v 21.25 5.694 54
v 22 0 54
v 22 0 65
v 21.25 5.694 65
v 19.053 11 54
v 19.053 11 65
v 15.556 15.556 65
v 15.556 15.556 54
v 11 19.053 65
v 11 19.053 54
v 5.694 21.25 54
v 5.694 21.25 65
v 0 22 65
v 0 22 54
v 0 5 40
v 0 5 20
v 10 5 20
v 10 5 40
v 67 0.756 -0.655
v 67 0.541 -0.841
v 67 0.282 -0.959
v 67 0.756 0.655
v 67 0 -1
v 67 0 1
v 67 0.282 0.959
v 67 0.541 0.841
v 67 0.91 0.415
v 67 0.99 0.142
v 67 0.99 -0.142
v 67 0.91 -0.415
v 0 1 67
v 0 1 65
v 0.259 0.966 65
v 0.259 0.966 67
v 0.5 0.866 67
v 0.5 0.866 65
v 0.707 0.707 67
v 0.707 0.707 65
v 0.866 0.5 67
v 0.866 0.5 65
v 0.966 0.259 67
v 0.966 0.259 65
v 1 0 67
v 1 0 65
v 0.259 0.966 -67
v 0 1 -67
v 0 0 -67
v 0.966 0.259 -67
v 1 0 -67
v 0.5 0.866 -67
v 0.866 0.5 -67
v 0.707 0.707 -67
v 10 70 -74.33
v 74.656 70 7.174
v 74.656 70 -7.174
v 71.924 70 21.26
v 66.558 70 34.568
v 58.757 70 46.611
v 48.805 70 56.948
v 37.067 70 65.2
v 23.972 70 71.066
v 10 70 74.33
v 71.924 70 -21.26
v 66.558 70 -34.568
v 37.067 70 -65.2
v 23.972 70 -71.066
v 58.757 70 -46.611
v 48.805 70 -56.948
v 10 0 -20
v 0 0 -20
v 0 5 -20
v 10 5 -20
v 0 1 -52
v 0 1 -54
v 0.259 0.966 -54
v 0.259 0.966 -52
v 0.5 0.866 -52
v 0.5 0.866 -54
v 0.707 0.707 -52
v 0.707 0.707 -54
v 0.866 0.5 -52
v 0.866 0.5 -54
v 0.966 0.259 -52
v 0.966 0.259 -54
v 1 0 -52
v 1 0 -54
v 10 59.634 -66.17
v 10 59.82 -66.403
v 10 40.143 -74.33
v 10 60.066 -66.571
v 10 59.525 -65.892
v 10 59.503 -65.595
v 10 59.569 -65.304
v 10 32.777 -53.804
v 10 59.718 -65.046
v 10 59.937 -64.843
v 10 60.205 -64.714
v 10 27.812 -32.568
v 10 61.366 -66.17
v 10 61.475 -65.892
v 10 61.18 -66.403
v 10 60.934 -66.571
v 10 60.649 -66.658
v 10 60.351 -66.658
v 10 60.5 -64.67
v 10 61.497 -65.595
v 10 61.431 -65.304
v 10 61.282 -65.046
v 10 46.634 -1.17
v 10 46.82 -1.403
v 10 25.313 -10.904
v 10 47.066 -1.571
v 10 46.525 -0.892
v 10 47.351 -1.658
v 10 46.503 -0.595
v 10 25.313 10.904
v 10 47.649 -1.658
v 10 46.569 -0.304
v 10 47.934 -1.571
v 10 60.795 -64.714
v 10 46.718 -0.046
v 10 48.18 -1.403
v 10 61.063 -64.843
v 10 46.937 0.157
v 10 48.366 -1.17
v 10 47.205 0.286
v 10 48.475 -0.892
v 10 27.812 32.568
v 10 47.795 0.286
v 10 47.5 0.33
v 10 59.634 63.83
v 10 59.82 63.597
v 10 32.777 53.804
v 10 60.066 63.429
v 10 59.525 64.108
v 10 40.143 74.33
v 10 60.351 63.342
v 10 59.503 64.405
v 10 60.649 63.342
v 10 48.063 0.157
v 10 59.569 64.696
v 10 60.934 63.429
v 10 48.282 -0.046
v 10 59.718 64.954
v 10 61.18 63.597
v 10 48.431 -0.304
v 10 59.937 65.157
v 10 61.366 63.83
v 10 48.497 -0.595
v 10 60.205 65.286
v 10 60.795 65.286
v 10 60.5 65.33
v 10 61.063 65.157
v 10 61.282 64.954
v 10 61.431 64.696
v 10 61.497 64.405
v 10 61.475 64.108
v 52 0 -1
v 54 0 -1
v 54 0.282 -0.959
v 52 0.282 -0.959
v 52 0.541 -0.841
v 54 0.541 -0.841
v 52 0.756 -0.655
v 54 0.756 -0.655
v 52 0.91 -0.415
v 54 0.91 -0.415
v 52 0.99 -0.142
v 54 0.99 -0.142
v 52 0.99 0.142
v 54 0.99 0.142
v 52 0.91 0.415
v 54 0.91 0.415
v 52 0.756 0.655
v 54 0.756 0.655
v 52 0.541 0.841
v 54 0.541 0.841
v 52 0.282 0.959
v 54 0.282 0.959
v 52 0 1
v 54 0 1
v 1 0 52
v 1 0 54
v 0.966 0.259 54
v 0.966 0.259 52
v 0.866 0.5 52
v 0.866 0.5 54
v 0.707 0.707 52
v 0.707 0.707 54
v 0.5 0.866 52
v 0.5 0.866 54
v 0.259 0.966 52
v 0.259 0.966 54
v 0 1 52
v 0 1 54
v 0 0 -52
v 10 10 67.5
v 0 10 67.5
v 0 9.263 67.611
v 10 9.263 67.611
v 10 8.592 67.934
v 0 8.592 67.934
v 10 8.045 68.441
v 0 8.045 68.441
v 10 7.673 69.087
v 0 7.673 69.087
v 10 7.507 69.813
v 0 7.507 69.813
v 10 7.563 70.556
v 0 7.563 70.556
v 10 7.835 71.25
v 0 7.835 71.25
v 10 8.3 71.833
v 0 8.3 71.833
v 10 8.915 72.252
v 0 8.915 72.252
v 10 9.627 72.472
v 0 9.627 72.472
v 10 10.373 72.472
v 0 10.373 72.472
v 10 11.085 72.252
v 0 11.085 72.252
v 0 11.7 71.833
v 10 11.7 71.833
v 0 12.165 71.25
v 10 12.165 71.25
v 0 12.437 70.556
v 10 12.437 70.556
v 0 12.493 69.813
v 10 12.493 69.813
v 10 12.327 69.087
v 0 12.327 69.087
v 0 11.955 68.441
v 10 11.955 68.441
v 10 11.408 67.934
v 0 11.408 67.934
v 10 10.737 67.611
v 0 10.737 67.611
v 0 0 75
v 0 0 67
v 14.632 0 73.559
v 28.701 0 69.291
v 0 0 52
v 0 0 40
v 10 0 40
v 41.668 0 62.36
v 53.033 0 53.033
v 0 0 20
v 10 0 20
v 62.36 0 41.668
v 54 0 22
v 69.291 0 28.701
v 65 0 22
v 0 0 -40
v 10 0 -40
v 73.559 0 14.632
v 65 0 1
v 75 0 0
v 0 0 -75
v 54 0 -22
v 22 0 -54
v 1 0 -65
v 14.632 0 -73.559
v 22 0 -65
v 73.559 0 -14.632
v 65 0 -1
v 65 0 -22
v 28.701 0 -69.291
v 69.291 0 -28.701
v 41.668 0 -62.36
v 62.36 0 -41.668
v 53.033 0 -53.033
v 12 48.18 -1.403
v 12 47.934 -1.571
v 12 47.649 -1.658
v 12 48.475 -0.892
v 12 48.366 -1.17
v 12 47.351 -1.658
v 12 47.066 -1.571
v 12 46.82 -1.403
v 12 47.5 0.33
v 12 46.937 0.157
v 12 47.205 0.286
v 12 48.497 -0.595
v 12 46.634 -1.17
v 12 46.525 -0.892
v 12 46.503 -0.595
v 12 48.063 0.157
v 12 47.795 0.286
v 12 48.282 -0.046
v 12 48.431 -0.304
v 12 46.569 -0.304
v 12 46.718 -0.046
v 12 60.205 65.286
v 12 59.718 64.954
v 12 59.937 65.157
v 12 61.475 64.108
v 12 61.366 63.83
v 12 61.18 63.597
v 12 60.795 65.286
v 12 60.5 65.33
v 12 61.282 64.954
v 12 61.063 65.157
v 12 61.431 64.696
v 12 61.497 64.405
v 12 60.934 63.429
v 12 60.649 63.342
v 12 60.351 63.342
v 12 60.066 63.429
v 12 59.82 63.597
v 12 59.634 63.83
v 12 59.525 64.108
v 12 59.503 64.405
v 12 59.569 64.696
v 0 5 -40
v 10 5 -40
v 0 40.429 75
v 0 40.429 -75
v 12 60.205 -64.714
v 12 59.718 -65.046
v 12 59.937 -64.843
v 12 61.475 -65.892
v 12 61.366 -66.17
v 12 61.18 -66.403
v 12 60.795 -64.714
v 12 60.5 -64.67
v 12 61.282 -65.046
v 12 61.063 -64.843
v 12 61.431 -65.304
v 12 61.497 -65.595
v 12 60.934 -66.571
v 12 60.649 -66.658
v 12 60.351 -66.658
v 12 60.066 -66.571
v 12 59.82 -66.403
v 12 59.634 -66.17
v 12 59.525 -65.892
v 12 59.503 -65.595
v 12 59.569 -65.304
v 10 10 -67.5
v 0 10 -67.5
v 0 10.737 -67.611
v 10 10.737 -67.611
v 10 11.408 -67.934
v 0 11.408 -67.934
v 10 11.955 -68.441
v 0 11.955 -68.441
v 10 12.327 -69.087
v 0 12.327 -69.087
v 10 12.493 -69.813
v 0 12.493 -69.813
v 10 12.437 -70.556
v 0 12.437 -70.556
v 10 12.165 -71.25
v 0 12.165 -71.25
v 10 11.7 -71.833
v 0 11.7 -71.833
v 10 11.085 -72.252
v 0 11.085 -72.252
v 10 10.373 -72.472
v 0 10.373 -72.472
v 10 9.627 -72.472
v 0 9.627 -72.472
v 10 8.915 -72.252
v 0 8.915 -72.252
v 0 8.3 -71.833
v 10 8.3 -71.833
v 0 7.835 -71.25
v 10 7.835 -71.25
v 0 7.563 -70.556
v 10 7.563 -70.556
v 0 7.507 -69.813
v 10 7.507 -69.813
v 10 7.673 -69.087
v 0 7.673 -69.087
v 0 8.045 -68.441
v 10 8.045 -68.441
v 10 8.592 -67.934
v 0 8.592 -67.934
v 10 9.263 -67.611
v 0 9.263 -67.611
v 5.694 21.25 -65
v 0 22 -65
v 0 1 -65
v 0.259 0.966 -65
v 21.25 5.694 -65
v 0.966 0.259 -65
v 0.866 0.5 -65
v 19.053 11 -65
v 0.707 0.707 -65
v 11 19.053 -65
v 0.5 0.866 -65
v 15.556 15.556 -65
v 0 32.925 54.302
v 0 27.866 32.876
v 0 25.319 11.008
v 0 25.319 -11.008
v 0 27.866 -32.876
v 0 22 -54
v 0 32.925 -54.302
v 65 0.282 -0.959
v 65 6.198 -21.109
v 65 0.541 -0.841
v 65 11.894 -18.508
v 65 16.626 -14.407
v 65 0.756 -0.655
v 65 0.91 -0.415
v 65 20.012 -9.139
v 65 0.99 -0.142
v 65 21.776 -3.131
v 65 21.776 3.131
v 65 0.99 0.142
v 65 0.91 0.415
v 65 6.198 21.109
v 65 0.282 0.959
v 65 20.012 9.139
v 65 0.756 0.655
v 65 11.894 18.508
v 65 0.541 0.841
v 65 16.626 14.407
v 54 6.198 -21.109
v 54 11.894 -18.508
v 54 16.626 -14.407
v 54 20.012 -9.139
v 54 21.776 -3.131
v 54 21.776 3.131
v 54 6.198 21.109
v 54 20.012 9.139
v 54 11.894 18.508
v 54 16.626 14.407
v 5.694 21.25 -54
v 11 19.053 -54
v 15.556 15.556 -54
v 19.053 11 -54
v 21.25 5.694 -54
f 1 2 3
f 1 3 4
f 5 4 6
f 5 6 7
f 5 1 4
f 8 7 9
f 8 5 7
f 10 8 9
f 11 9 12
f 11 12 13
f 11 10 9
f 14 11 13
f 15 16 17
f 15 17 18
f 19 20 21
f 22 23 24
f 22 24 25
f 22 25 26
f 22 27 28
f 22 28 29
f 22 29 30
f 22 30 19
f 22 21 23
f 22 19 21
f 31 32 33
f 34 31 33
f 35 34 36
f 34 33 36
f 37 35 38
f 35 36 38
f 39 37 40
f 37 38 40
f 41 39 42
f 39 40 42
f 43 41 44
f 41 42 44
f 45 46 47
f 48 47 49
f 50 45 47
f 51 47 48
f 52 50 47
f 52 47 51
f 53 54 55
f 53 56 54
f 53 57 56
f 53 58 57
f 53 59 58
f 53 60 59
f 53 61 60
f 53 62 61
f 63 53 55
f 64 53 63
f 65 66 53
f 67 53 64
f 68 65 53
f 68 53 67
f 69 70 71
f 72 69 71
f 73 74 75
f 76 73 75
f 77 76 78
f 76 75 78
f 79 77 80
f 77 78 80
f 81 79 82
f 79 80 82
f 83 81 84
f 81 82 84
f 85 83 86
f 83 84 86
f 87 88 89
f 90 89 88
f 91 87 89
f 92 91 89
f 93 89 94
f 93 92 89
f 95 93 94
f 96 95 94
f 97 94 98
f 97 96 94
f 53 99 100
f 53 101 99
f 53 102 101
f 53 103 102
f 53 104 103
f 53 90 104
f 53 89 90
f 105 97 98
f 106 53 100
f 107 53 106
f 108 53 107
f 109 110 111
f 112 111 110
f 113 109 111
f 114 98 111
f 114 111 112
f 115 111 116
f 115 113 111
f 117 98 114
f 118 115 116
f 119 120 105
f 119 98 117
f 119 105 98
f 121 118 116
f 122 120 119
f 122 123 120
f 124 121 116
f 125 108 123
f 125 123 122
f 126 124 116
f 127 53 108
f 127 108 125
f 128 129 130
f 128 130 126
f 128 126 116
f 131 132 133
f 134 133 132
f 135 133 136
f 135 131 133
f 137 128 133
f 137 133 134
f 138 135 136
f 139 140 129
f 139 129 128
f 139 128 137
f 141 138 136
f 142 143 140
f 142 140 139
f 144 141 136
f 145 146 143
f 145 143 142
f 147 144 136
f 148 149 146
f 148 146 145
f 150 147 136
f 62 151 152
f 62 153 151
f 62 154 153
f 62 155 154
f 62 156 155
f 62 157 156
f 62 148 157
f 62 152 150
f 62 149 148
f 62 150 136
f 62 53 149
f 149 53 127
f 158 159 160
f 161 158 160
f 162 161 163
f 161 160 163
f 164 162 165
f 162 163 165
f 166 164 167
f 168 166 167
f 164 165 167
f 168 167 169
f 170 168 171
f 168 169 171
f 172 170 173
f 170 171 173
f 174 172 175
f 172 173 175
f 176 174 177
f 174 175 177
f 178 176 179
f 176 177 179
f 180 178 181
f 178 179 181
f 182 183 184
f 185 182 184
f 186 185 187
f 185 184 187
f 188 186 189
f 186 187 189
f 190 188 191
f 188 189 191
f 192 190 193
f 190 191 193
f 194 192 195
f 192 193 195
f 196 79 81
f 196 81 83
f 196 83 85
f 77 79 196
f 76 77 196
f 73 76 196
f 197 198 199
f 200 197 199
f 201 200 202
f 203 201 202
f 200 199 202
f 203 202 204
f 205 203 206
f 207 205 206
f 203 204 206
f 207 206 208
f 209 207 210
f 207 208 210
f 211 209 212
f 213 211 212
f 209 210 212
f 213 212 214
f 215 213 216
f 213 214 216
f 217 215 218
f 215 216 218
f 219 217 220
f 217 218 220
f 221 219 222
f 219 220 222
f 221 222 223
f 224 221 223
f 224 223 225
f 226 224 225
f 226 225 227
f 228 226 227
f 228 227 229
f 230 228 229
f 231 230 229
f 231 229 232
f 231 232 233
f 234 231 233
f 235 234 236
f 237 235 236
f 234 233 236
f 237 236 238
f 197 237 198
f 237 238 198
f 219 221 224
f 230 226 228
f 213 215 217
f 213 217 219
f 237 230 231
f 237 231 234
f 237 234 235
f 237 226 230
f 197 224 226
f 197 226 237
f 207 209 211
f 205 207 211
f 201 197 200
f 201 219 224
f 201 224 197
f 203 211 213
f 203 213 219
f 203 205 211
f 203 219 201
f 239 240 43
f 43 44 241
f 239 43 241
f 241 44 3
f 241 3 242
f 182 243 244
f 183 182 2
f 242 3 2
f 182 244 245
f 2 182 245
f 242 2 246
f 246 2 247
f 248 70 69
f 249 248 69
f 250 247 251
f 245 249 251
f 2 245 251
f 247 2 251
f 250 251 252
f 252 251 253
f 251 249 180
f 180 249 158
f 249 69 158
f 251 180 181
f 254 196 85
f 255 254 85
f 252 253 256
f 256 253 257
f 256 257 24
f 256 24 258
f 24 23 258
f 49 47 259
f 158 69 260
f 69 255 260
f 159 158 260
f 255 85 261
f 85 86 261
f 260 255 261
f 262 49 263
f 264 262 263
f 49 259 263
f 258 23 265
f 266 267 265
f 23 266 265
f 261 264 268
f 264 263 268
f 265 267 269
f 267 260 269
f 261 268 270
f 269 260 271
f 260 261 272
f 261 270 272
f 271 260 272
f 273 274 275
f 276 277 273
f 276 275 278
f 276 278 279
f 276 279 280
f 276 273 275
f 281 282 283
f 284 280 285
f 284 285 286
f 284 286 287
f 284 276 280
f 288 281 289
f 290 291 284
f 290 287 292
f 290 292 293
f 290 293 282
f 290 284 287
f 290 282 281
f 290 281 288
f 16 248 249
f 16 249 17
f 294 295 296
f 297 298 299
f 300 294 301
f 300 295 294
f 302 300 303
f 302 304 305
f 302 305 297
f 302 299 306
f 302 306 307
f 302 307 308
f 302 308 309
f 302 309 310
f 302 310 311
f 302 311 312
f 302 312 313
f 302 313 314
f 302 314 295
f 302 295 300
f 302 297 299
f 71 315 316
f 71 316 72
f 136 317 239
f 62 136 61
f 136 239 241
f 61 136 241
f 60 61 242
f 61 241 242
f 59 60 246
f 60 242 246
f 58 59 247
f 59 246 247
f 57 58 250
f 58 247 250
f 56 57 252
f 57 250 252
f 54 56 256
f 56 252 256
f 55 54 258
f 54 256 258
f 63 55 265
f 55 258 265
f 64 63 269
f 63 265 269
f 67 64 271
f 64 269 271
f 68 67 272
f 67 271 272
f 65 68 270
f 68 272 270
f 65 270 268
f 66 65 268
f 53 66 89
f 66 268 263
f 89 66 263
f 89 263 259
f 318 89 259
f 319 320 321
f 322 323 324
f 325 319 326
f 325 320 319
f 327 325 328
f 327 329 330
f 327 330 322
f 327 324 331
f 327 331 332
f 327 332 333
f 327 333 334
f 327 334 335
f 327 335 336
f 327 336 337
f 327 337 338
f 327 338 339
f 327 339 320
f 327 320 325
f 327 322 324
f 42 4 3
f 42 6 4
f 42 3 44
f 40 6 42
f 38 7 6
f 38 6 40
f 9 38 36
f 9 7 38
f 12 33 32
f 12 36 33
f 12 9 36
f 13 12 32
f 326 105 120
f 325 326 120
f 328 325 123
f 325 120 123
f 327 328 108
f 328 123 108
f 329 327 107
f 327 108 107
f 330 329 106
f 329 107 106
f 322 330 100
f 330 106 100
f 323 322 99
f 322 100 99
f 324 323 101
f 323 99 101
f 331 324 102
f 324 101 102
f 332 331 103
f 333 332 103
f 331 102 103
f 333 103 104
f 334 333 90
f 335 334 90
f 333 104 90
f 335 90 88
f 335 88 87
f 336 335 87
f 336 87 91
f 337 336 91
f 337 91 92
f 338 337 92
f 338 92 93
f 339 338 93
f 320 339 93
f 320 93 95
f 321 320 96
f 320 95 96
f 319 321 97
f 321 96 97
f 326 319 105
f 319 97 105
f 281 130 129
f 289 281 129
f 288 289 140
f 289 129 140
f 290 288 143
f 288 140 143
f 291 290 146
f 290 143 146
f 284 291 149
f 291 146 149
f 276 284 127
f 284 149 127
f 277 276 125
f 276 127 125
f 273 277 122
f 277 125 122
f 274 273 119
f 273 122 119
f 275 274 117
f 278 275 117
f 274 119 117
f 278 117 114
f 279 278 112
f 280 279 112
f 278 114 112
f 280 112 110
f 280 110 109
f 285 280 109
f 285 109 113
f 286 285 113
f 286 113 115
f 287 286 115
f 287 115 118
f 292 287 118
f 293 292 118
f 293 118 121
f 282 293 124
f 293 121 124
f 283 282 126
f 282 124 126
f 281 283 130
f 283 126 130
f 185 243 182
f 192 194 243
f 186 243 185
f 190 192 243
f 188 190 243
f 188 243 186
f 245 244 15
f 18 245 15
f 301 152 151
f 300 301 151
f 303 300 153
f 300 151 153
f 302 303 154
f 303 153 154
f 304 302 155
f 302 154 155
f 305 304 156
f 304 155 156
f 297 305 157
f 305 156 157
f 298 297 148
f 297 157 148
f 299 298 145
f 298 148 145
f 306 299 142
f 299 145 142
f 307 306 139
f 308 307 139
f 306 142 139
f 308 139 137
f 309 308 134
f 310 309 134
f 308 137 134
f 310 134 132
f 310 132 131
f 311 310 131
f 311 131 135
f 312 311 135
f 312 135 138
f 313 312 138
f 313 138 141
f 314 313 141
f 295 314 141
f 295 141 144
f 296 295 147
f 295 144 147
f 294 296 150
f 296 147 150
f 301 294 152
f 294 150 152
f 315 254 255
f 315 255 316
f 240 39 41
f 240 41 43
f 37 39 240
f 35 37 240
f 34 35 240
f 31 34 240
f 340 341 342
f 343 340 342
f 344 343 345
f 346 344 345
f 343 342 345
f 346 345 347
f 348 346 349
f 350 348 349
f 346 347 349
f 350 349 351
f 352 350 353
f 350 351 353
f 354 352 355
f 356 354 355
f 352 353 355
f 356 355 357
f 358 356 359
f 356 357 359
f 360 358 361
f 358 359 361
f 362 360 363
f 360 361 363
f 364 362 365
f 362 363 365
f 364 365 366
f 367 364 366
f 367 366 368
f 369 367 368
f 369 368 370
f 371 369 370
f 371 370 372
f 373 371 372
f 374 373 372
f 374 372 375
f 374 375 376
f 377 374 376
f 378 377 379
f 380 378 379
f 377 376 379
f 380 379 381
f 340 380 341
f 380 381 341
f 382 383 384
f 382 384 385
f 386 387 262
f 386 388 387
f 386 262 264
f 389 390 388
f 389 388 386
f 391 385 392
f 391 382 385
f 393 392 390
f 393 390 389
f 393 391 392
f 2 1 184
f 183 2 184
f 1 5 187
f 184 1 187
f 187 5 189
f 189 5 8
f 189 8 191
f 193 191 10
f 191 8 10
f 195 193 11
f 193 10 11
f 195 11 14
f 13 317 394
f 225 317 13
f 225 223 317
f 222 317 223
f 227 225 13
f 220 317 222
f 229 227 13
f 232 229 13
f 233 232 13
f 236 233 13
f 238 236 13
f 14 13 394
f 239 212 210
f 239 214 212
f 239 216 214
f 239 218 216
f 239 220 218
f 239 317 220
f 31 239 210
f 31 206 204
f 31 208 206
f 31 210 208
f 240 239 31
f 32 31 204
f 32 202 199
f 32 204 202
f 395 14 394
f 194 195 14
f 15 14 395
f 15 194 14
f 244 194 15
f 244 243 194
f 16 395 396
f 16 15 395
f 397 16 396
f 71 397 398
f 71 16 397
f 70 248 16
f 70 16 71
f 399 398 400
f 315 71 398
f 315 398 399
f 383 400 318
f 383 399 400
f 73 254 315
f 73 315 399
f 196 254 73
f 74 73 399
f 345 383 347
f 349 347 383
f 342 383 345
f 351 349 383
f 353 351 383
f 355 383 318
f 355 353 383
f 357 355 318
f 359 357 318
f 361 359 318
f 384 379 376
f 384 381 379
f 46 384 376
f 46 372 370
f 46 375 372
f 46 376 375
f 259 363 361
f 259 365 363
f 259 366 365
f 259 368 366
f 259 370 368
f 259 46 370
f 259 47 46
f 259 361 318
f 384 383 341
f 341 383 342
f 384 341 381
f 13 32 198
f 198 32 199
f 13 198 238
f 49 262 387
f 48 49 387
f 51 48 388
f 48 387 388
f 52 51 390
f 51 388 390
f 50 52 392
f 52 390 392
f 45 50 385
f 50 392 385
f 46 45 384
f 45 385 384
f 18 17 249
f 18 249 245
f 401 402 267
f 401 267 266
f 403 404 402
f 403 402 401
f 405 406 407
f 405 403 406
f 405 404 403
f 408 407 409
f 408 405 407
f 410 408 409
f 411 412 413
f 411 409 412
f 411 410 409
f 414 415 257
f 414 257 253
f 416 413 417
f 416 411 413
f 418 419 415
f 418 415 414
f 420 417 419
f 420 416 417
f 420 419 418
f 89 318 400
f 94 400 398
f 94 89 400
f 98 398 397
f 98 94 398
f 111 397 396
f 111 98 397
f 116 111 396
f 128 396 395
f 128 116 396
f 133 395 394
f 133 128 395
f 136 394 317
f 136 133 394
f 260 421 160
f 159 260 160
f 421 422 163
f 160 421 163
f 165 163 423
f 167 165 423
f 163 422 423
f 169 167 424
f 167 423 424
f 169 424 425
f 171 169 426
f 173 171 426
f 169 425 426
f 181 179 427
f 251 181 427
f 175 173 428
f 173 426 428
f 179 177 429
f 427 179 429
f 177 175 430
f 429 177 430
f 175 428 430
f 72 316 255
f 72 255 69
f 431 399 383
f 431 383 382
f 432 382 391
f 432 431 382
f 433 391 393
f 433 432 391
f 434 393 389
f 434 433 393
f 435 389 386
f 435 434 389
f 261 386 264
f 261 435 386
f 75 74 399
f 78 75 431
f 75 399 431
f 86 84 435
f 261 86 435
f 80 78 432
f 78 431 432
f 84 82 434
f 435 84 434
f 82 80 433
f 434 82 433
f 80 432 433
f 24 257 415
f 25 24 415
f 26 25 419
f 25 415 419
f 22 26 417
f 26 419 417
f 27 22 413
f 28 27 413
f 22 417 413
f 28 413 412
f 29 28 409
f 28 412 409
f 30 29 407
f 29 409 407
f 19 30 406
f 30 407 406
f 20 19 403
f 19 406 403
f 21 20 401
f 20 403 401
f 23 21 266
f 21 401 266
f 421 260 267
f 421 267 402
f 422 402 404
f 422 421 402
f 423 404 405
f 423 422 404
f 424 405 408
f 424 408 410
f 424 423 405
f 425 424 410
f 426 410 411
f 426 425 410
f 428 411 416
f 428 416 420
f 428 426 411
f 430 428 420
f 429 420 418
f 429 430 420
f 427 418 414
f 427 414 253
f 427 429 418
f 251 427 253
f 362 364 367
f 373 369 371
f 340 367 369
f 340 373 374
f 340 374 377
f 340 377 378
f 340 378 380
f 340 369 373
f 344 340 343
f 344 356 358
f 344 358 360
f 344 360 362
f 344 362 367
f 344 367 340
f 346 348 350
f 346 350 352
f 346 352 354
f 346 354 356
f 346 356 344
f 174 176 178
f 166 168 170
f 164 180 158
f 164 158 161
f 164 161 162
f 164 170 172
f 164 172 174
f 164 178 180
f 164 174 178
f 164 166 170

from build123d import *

# Parameters (mm, degrees)
BOSS_EXTRUDE2_DEPTH = 100
SKETCH3_W           = 11
SKETCH3_H           = 22
SKETCH4_R           = 1
CUT_EXTRUDE1_DEPTH  = 2
SKETCH5_R           = 1
CUT_EXTRUDE2_DEPTH  = 2
CIRPATTERN1_COUNT   = 4
SKETCH6_W           = 10
SKETCH6_H           = 190
BOSS_EXTRUDE4_DEPTH = 115
SKETCH10_W          = 10
SKETCH10_H          = 190
SKETCH11_R          = 1
CUT_EXTRUDE3_DEPTH  = 2
SKETCH8_R           = 2.5
SKETCH8_W           = 20
SKETCH8_H           = 5
CUT_EXTRUDE4_DEPTH  = 10
SKETCH12_R          = 75
CUT_EXTRUDE5_DEPTH  = 30


with BuildPart() as part:
    # Sketch1 → Boss-Extrude2 (new body)
    with BuildSketch(Plane(origin=(0, 0, 0), x_dir=(1, 0, 0), z_dir=(0, 1, 0))):
        with BuildLine():
            ThreePointArc((75, 0), (53.033008589, 53.033008589), (0, 75))
            Line((0, 75), (0, -75))
            ThreePointArc((0, -75), (53.033008589, -53.033008589), (75, 0))
        make_face()
    extrude(amount=BOSS_EXTRUDE2_DEPTH)

    # Sketch3 → Cut-Revolve3 (revolve, cut)
    with BuildSketch(Plane(origin=(0, 0, 0), x_dir=(-1, 0, 0), z_dir=(0, -1, 0))):
        with Locations((-59.5, 11)):
            Rectangle(SKETCH3_W, SKETCH3_H)
    cut_revolve3 = revolve(axis=Axis((0, 0, 0), (1, 0, 0)), mode=Mode.SUBTRACT)

    # Sketch4 → Cut-Extrude1 (cut)
    with BuildSketch(Plane.ZY.offset(-65)):
        Circle(SKETCH4_R)
    cut_extrude1 = extrude(amount=-CUT_EXTRUDE1_DEPTH, mode=Mode.SUBTRACT)

    # Sketch5 → Cut-Extrude2 (cut)
    with BuildSketch(Plane(origin=(54, 0, 0), x_dir=(0, 0, -1), z_dir=(1, 0, 0))):
        Circle(SKETCH5_R)
    cut_extrude2 = extrude(amount=-CUT_EXTRUDE2_DEPTH, mode=Mode.SUBTRACT)

    # CirPattern1: Cut-Revolve3, Cut-Extrude1, Cut-Extrude2 ×4 about axis
    cirpattern1_axis = Axis((0, 0, 0), (0, 1, 0))
    add([cut_revolve3.rotate(cirpattern1_axis, i * 360 / CIRPATTERN1_COUNT) for i in range(1, CIRPATTERN1_COUNT)], mode=Mode.SUBTRACT)
    add([cut_extrude1.rotate(cirpattern1_axis, i * 360 / CIRPATTERN1_COUNT) for i in range(1, CIRPATTERN1_COUNT)], mode=Mode.SUBTRACT)
    add([cut_extrude2.rotate(cirpattern1_axis, i * 360 / CIRPATTERN1_COUNT) for i in range(1, CIRPATTERN1_COUNT)], mode=Mode.SUBTRACT)

    # Sketch6 → Boss-Extrude4 (add)
    with BuildSketch(Plane(origin=(0, 100, 0), x_dir=(1, 0, 0), z_dir=(0, 1, 0))):
        with Locations((5, -95)):
            Rectangle(SKETCH6_W, SKETCH6_H)
    extrude(amount=BOSS_EXTRUDE4_DEPTH)

    # Sketch10 → Cut-Revolve4 (revolve, cut)
    with BuildSketch(Plane(origin=(0, 215, 0), x_dir=(1, 0, 0), z_dir=(0, 1, 0))):
        with Locations((5, -95)):
            Rectangle(SKETCH10_W, SKETCH10_H)
    revolve(axis=Axis((10, 215, 0), (-1, 0, 0)), mode=Mode.SUBTRACT)


with BuildPart() as cut_revolve4_kept_piece:
    # of the separate pieces the step leaves, the one the design keeps (cut_revolve4_pieces_kept)
    add(part.part.solids().sort_by_distance((0, 0, 75))[0])

    # Sketch11 → Cut-Extrude3 (cut)
    with BuildSketch(Plane.ZY.offset(-10)):
        with Locations((-0.669656263, 47.5)):
            Circle(SKETCH11_R)
        with Locations((-65.669656263, 60.5)):
            Circle(SKETCH11_R)
        with Locations((64.330343737, 60.5)):
            Circle(SKETCH11_R)
    extrude(amount=-CUT_EXTRUDE3_DEPTH, mode=Mode.SUBTRACT)

    # Sketch8 → Cut-Extrude4 (cut)
    with BuildSketch(Plane.ZY):
        with Locations((-70, 10)):
            Circle(SKETCH8_R)
        with Locations(Location((70, 10, 0), (0, 0, 180))):
            Circle(SKETCH8_R)
        with Locations((-30, 2.5)):
            Rectangle(SKETCH8_W, SKETCH8_H)
        with Locations((30, 2.5)):
            Rectangle(SKETCH8_W, SKETCH8_H)
    extrude(amount=-CUT_EXTRUDE4_DEPTH, mode=Mode.SUBTRACT)

    # Sketch12 → Cut-Extrude5 (cut)
    with BuildSketch(Plane(origin=(0, 100, 0), x_dir=(1, 0, 0), z_dir=(0, 1, 0))):
        Circle(SKETCH12_R)
    extrude(amount=-CUT_EXTRUDE5_DEPTH, mode=Mode.SUBTRACT)


solid = cut_revolve4_kept_piece.part
